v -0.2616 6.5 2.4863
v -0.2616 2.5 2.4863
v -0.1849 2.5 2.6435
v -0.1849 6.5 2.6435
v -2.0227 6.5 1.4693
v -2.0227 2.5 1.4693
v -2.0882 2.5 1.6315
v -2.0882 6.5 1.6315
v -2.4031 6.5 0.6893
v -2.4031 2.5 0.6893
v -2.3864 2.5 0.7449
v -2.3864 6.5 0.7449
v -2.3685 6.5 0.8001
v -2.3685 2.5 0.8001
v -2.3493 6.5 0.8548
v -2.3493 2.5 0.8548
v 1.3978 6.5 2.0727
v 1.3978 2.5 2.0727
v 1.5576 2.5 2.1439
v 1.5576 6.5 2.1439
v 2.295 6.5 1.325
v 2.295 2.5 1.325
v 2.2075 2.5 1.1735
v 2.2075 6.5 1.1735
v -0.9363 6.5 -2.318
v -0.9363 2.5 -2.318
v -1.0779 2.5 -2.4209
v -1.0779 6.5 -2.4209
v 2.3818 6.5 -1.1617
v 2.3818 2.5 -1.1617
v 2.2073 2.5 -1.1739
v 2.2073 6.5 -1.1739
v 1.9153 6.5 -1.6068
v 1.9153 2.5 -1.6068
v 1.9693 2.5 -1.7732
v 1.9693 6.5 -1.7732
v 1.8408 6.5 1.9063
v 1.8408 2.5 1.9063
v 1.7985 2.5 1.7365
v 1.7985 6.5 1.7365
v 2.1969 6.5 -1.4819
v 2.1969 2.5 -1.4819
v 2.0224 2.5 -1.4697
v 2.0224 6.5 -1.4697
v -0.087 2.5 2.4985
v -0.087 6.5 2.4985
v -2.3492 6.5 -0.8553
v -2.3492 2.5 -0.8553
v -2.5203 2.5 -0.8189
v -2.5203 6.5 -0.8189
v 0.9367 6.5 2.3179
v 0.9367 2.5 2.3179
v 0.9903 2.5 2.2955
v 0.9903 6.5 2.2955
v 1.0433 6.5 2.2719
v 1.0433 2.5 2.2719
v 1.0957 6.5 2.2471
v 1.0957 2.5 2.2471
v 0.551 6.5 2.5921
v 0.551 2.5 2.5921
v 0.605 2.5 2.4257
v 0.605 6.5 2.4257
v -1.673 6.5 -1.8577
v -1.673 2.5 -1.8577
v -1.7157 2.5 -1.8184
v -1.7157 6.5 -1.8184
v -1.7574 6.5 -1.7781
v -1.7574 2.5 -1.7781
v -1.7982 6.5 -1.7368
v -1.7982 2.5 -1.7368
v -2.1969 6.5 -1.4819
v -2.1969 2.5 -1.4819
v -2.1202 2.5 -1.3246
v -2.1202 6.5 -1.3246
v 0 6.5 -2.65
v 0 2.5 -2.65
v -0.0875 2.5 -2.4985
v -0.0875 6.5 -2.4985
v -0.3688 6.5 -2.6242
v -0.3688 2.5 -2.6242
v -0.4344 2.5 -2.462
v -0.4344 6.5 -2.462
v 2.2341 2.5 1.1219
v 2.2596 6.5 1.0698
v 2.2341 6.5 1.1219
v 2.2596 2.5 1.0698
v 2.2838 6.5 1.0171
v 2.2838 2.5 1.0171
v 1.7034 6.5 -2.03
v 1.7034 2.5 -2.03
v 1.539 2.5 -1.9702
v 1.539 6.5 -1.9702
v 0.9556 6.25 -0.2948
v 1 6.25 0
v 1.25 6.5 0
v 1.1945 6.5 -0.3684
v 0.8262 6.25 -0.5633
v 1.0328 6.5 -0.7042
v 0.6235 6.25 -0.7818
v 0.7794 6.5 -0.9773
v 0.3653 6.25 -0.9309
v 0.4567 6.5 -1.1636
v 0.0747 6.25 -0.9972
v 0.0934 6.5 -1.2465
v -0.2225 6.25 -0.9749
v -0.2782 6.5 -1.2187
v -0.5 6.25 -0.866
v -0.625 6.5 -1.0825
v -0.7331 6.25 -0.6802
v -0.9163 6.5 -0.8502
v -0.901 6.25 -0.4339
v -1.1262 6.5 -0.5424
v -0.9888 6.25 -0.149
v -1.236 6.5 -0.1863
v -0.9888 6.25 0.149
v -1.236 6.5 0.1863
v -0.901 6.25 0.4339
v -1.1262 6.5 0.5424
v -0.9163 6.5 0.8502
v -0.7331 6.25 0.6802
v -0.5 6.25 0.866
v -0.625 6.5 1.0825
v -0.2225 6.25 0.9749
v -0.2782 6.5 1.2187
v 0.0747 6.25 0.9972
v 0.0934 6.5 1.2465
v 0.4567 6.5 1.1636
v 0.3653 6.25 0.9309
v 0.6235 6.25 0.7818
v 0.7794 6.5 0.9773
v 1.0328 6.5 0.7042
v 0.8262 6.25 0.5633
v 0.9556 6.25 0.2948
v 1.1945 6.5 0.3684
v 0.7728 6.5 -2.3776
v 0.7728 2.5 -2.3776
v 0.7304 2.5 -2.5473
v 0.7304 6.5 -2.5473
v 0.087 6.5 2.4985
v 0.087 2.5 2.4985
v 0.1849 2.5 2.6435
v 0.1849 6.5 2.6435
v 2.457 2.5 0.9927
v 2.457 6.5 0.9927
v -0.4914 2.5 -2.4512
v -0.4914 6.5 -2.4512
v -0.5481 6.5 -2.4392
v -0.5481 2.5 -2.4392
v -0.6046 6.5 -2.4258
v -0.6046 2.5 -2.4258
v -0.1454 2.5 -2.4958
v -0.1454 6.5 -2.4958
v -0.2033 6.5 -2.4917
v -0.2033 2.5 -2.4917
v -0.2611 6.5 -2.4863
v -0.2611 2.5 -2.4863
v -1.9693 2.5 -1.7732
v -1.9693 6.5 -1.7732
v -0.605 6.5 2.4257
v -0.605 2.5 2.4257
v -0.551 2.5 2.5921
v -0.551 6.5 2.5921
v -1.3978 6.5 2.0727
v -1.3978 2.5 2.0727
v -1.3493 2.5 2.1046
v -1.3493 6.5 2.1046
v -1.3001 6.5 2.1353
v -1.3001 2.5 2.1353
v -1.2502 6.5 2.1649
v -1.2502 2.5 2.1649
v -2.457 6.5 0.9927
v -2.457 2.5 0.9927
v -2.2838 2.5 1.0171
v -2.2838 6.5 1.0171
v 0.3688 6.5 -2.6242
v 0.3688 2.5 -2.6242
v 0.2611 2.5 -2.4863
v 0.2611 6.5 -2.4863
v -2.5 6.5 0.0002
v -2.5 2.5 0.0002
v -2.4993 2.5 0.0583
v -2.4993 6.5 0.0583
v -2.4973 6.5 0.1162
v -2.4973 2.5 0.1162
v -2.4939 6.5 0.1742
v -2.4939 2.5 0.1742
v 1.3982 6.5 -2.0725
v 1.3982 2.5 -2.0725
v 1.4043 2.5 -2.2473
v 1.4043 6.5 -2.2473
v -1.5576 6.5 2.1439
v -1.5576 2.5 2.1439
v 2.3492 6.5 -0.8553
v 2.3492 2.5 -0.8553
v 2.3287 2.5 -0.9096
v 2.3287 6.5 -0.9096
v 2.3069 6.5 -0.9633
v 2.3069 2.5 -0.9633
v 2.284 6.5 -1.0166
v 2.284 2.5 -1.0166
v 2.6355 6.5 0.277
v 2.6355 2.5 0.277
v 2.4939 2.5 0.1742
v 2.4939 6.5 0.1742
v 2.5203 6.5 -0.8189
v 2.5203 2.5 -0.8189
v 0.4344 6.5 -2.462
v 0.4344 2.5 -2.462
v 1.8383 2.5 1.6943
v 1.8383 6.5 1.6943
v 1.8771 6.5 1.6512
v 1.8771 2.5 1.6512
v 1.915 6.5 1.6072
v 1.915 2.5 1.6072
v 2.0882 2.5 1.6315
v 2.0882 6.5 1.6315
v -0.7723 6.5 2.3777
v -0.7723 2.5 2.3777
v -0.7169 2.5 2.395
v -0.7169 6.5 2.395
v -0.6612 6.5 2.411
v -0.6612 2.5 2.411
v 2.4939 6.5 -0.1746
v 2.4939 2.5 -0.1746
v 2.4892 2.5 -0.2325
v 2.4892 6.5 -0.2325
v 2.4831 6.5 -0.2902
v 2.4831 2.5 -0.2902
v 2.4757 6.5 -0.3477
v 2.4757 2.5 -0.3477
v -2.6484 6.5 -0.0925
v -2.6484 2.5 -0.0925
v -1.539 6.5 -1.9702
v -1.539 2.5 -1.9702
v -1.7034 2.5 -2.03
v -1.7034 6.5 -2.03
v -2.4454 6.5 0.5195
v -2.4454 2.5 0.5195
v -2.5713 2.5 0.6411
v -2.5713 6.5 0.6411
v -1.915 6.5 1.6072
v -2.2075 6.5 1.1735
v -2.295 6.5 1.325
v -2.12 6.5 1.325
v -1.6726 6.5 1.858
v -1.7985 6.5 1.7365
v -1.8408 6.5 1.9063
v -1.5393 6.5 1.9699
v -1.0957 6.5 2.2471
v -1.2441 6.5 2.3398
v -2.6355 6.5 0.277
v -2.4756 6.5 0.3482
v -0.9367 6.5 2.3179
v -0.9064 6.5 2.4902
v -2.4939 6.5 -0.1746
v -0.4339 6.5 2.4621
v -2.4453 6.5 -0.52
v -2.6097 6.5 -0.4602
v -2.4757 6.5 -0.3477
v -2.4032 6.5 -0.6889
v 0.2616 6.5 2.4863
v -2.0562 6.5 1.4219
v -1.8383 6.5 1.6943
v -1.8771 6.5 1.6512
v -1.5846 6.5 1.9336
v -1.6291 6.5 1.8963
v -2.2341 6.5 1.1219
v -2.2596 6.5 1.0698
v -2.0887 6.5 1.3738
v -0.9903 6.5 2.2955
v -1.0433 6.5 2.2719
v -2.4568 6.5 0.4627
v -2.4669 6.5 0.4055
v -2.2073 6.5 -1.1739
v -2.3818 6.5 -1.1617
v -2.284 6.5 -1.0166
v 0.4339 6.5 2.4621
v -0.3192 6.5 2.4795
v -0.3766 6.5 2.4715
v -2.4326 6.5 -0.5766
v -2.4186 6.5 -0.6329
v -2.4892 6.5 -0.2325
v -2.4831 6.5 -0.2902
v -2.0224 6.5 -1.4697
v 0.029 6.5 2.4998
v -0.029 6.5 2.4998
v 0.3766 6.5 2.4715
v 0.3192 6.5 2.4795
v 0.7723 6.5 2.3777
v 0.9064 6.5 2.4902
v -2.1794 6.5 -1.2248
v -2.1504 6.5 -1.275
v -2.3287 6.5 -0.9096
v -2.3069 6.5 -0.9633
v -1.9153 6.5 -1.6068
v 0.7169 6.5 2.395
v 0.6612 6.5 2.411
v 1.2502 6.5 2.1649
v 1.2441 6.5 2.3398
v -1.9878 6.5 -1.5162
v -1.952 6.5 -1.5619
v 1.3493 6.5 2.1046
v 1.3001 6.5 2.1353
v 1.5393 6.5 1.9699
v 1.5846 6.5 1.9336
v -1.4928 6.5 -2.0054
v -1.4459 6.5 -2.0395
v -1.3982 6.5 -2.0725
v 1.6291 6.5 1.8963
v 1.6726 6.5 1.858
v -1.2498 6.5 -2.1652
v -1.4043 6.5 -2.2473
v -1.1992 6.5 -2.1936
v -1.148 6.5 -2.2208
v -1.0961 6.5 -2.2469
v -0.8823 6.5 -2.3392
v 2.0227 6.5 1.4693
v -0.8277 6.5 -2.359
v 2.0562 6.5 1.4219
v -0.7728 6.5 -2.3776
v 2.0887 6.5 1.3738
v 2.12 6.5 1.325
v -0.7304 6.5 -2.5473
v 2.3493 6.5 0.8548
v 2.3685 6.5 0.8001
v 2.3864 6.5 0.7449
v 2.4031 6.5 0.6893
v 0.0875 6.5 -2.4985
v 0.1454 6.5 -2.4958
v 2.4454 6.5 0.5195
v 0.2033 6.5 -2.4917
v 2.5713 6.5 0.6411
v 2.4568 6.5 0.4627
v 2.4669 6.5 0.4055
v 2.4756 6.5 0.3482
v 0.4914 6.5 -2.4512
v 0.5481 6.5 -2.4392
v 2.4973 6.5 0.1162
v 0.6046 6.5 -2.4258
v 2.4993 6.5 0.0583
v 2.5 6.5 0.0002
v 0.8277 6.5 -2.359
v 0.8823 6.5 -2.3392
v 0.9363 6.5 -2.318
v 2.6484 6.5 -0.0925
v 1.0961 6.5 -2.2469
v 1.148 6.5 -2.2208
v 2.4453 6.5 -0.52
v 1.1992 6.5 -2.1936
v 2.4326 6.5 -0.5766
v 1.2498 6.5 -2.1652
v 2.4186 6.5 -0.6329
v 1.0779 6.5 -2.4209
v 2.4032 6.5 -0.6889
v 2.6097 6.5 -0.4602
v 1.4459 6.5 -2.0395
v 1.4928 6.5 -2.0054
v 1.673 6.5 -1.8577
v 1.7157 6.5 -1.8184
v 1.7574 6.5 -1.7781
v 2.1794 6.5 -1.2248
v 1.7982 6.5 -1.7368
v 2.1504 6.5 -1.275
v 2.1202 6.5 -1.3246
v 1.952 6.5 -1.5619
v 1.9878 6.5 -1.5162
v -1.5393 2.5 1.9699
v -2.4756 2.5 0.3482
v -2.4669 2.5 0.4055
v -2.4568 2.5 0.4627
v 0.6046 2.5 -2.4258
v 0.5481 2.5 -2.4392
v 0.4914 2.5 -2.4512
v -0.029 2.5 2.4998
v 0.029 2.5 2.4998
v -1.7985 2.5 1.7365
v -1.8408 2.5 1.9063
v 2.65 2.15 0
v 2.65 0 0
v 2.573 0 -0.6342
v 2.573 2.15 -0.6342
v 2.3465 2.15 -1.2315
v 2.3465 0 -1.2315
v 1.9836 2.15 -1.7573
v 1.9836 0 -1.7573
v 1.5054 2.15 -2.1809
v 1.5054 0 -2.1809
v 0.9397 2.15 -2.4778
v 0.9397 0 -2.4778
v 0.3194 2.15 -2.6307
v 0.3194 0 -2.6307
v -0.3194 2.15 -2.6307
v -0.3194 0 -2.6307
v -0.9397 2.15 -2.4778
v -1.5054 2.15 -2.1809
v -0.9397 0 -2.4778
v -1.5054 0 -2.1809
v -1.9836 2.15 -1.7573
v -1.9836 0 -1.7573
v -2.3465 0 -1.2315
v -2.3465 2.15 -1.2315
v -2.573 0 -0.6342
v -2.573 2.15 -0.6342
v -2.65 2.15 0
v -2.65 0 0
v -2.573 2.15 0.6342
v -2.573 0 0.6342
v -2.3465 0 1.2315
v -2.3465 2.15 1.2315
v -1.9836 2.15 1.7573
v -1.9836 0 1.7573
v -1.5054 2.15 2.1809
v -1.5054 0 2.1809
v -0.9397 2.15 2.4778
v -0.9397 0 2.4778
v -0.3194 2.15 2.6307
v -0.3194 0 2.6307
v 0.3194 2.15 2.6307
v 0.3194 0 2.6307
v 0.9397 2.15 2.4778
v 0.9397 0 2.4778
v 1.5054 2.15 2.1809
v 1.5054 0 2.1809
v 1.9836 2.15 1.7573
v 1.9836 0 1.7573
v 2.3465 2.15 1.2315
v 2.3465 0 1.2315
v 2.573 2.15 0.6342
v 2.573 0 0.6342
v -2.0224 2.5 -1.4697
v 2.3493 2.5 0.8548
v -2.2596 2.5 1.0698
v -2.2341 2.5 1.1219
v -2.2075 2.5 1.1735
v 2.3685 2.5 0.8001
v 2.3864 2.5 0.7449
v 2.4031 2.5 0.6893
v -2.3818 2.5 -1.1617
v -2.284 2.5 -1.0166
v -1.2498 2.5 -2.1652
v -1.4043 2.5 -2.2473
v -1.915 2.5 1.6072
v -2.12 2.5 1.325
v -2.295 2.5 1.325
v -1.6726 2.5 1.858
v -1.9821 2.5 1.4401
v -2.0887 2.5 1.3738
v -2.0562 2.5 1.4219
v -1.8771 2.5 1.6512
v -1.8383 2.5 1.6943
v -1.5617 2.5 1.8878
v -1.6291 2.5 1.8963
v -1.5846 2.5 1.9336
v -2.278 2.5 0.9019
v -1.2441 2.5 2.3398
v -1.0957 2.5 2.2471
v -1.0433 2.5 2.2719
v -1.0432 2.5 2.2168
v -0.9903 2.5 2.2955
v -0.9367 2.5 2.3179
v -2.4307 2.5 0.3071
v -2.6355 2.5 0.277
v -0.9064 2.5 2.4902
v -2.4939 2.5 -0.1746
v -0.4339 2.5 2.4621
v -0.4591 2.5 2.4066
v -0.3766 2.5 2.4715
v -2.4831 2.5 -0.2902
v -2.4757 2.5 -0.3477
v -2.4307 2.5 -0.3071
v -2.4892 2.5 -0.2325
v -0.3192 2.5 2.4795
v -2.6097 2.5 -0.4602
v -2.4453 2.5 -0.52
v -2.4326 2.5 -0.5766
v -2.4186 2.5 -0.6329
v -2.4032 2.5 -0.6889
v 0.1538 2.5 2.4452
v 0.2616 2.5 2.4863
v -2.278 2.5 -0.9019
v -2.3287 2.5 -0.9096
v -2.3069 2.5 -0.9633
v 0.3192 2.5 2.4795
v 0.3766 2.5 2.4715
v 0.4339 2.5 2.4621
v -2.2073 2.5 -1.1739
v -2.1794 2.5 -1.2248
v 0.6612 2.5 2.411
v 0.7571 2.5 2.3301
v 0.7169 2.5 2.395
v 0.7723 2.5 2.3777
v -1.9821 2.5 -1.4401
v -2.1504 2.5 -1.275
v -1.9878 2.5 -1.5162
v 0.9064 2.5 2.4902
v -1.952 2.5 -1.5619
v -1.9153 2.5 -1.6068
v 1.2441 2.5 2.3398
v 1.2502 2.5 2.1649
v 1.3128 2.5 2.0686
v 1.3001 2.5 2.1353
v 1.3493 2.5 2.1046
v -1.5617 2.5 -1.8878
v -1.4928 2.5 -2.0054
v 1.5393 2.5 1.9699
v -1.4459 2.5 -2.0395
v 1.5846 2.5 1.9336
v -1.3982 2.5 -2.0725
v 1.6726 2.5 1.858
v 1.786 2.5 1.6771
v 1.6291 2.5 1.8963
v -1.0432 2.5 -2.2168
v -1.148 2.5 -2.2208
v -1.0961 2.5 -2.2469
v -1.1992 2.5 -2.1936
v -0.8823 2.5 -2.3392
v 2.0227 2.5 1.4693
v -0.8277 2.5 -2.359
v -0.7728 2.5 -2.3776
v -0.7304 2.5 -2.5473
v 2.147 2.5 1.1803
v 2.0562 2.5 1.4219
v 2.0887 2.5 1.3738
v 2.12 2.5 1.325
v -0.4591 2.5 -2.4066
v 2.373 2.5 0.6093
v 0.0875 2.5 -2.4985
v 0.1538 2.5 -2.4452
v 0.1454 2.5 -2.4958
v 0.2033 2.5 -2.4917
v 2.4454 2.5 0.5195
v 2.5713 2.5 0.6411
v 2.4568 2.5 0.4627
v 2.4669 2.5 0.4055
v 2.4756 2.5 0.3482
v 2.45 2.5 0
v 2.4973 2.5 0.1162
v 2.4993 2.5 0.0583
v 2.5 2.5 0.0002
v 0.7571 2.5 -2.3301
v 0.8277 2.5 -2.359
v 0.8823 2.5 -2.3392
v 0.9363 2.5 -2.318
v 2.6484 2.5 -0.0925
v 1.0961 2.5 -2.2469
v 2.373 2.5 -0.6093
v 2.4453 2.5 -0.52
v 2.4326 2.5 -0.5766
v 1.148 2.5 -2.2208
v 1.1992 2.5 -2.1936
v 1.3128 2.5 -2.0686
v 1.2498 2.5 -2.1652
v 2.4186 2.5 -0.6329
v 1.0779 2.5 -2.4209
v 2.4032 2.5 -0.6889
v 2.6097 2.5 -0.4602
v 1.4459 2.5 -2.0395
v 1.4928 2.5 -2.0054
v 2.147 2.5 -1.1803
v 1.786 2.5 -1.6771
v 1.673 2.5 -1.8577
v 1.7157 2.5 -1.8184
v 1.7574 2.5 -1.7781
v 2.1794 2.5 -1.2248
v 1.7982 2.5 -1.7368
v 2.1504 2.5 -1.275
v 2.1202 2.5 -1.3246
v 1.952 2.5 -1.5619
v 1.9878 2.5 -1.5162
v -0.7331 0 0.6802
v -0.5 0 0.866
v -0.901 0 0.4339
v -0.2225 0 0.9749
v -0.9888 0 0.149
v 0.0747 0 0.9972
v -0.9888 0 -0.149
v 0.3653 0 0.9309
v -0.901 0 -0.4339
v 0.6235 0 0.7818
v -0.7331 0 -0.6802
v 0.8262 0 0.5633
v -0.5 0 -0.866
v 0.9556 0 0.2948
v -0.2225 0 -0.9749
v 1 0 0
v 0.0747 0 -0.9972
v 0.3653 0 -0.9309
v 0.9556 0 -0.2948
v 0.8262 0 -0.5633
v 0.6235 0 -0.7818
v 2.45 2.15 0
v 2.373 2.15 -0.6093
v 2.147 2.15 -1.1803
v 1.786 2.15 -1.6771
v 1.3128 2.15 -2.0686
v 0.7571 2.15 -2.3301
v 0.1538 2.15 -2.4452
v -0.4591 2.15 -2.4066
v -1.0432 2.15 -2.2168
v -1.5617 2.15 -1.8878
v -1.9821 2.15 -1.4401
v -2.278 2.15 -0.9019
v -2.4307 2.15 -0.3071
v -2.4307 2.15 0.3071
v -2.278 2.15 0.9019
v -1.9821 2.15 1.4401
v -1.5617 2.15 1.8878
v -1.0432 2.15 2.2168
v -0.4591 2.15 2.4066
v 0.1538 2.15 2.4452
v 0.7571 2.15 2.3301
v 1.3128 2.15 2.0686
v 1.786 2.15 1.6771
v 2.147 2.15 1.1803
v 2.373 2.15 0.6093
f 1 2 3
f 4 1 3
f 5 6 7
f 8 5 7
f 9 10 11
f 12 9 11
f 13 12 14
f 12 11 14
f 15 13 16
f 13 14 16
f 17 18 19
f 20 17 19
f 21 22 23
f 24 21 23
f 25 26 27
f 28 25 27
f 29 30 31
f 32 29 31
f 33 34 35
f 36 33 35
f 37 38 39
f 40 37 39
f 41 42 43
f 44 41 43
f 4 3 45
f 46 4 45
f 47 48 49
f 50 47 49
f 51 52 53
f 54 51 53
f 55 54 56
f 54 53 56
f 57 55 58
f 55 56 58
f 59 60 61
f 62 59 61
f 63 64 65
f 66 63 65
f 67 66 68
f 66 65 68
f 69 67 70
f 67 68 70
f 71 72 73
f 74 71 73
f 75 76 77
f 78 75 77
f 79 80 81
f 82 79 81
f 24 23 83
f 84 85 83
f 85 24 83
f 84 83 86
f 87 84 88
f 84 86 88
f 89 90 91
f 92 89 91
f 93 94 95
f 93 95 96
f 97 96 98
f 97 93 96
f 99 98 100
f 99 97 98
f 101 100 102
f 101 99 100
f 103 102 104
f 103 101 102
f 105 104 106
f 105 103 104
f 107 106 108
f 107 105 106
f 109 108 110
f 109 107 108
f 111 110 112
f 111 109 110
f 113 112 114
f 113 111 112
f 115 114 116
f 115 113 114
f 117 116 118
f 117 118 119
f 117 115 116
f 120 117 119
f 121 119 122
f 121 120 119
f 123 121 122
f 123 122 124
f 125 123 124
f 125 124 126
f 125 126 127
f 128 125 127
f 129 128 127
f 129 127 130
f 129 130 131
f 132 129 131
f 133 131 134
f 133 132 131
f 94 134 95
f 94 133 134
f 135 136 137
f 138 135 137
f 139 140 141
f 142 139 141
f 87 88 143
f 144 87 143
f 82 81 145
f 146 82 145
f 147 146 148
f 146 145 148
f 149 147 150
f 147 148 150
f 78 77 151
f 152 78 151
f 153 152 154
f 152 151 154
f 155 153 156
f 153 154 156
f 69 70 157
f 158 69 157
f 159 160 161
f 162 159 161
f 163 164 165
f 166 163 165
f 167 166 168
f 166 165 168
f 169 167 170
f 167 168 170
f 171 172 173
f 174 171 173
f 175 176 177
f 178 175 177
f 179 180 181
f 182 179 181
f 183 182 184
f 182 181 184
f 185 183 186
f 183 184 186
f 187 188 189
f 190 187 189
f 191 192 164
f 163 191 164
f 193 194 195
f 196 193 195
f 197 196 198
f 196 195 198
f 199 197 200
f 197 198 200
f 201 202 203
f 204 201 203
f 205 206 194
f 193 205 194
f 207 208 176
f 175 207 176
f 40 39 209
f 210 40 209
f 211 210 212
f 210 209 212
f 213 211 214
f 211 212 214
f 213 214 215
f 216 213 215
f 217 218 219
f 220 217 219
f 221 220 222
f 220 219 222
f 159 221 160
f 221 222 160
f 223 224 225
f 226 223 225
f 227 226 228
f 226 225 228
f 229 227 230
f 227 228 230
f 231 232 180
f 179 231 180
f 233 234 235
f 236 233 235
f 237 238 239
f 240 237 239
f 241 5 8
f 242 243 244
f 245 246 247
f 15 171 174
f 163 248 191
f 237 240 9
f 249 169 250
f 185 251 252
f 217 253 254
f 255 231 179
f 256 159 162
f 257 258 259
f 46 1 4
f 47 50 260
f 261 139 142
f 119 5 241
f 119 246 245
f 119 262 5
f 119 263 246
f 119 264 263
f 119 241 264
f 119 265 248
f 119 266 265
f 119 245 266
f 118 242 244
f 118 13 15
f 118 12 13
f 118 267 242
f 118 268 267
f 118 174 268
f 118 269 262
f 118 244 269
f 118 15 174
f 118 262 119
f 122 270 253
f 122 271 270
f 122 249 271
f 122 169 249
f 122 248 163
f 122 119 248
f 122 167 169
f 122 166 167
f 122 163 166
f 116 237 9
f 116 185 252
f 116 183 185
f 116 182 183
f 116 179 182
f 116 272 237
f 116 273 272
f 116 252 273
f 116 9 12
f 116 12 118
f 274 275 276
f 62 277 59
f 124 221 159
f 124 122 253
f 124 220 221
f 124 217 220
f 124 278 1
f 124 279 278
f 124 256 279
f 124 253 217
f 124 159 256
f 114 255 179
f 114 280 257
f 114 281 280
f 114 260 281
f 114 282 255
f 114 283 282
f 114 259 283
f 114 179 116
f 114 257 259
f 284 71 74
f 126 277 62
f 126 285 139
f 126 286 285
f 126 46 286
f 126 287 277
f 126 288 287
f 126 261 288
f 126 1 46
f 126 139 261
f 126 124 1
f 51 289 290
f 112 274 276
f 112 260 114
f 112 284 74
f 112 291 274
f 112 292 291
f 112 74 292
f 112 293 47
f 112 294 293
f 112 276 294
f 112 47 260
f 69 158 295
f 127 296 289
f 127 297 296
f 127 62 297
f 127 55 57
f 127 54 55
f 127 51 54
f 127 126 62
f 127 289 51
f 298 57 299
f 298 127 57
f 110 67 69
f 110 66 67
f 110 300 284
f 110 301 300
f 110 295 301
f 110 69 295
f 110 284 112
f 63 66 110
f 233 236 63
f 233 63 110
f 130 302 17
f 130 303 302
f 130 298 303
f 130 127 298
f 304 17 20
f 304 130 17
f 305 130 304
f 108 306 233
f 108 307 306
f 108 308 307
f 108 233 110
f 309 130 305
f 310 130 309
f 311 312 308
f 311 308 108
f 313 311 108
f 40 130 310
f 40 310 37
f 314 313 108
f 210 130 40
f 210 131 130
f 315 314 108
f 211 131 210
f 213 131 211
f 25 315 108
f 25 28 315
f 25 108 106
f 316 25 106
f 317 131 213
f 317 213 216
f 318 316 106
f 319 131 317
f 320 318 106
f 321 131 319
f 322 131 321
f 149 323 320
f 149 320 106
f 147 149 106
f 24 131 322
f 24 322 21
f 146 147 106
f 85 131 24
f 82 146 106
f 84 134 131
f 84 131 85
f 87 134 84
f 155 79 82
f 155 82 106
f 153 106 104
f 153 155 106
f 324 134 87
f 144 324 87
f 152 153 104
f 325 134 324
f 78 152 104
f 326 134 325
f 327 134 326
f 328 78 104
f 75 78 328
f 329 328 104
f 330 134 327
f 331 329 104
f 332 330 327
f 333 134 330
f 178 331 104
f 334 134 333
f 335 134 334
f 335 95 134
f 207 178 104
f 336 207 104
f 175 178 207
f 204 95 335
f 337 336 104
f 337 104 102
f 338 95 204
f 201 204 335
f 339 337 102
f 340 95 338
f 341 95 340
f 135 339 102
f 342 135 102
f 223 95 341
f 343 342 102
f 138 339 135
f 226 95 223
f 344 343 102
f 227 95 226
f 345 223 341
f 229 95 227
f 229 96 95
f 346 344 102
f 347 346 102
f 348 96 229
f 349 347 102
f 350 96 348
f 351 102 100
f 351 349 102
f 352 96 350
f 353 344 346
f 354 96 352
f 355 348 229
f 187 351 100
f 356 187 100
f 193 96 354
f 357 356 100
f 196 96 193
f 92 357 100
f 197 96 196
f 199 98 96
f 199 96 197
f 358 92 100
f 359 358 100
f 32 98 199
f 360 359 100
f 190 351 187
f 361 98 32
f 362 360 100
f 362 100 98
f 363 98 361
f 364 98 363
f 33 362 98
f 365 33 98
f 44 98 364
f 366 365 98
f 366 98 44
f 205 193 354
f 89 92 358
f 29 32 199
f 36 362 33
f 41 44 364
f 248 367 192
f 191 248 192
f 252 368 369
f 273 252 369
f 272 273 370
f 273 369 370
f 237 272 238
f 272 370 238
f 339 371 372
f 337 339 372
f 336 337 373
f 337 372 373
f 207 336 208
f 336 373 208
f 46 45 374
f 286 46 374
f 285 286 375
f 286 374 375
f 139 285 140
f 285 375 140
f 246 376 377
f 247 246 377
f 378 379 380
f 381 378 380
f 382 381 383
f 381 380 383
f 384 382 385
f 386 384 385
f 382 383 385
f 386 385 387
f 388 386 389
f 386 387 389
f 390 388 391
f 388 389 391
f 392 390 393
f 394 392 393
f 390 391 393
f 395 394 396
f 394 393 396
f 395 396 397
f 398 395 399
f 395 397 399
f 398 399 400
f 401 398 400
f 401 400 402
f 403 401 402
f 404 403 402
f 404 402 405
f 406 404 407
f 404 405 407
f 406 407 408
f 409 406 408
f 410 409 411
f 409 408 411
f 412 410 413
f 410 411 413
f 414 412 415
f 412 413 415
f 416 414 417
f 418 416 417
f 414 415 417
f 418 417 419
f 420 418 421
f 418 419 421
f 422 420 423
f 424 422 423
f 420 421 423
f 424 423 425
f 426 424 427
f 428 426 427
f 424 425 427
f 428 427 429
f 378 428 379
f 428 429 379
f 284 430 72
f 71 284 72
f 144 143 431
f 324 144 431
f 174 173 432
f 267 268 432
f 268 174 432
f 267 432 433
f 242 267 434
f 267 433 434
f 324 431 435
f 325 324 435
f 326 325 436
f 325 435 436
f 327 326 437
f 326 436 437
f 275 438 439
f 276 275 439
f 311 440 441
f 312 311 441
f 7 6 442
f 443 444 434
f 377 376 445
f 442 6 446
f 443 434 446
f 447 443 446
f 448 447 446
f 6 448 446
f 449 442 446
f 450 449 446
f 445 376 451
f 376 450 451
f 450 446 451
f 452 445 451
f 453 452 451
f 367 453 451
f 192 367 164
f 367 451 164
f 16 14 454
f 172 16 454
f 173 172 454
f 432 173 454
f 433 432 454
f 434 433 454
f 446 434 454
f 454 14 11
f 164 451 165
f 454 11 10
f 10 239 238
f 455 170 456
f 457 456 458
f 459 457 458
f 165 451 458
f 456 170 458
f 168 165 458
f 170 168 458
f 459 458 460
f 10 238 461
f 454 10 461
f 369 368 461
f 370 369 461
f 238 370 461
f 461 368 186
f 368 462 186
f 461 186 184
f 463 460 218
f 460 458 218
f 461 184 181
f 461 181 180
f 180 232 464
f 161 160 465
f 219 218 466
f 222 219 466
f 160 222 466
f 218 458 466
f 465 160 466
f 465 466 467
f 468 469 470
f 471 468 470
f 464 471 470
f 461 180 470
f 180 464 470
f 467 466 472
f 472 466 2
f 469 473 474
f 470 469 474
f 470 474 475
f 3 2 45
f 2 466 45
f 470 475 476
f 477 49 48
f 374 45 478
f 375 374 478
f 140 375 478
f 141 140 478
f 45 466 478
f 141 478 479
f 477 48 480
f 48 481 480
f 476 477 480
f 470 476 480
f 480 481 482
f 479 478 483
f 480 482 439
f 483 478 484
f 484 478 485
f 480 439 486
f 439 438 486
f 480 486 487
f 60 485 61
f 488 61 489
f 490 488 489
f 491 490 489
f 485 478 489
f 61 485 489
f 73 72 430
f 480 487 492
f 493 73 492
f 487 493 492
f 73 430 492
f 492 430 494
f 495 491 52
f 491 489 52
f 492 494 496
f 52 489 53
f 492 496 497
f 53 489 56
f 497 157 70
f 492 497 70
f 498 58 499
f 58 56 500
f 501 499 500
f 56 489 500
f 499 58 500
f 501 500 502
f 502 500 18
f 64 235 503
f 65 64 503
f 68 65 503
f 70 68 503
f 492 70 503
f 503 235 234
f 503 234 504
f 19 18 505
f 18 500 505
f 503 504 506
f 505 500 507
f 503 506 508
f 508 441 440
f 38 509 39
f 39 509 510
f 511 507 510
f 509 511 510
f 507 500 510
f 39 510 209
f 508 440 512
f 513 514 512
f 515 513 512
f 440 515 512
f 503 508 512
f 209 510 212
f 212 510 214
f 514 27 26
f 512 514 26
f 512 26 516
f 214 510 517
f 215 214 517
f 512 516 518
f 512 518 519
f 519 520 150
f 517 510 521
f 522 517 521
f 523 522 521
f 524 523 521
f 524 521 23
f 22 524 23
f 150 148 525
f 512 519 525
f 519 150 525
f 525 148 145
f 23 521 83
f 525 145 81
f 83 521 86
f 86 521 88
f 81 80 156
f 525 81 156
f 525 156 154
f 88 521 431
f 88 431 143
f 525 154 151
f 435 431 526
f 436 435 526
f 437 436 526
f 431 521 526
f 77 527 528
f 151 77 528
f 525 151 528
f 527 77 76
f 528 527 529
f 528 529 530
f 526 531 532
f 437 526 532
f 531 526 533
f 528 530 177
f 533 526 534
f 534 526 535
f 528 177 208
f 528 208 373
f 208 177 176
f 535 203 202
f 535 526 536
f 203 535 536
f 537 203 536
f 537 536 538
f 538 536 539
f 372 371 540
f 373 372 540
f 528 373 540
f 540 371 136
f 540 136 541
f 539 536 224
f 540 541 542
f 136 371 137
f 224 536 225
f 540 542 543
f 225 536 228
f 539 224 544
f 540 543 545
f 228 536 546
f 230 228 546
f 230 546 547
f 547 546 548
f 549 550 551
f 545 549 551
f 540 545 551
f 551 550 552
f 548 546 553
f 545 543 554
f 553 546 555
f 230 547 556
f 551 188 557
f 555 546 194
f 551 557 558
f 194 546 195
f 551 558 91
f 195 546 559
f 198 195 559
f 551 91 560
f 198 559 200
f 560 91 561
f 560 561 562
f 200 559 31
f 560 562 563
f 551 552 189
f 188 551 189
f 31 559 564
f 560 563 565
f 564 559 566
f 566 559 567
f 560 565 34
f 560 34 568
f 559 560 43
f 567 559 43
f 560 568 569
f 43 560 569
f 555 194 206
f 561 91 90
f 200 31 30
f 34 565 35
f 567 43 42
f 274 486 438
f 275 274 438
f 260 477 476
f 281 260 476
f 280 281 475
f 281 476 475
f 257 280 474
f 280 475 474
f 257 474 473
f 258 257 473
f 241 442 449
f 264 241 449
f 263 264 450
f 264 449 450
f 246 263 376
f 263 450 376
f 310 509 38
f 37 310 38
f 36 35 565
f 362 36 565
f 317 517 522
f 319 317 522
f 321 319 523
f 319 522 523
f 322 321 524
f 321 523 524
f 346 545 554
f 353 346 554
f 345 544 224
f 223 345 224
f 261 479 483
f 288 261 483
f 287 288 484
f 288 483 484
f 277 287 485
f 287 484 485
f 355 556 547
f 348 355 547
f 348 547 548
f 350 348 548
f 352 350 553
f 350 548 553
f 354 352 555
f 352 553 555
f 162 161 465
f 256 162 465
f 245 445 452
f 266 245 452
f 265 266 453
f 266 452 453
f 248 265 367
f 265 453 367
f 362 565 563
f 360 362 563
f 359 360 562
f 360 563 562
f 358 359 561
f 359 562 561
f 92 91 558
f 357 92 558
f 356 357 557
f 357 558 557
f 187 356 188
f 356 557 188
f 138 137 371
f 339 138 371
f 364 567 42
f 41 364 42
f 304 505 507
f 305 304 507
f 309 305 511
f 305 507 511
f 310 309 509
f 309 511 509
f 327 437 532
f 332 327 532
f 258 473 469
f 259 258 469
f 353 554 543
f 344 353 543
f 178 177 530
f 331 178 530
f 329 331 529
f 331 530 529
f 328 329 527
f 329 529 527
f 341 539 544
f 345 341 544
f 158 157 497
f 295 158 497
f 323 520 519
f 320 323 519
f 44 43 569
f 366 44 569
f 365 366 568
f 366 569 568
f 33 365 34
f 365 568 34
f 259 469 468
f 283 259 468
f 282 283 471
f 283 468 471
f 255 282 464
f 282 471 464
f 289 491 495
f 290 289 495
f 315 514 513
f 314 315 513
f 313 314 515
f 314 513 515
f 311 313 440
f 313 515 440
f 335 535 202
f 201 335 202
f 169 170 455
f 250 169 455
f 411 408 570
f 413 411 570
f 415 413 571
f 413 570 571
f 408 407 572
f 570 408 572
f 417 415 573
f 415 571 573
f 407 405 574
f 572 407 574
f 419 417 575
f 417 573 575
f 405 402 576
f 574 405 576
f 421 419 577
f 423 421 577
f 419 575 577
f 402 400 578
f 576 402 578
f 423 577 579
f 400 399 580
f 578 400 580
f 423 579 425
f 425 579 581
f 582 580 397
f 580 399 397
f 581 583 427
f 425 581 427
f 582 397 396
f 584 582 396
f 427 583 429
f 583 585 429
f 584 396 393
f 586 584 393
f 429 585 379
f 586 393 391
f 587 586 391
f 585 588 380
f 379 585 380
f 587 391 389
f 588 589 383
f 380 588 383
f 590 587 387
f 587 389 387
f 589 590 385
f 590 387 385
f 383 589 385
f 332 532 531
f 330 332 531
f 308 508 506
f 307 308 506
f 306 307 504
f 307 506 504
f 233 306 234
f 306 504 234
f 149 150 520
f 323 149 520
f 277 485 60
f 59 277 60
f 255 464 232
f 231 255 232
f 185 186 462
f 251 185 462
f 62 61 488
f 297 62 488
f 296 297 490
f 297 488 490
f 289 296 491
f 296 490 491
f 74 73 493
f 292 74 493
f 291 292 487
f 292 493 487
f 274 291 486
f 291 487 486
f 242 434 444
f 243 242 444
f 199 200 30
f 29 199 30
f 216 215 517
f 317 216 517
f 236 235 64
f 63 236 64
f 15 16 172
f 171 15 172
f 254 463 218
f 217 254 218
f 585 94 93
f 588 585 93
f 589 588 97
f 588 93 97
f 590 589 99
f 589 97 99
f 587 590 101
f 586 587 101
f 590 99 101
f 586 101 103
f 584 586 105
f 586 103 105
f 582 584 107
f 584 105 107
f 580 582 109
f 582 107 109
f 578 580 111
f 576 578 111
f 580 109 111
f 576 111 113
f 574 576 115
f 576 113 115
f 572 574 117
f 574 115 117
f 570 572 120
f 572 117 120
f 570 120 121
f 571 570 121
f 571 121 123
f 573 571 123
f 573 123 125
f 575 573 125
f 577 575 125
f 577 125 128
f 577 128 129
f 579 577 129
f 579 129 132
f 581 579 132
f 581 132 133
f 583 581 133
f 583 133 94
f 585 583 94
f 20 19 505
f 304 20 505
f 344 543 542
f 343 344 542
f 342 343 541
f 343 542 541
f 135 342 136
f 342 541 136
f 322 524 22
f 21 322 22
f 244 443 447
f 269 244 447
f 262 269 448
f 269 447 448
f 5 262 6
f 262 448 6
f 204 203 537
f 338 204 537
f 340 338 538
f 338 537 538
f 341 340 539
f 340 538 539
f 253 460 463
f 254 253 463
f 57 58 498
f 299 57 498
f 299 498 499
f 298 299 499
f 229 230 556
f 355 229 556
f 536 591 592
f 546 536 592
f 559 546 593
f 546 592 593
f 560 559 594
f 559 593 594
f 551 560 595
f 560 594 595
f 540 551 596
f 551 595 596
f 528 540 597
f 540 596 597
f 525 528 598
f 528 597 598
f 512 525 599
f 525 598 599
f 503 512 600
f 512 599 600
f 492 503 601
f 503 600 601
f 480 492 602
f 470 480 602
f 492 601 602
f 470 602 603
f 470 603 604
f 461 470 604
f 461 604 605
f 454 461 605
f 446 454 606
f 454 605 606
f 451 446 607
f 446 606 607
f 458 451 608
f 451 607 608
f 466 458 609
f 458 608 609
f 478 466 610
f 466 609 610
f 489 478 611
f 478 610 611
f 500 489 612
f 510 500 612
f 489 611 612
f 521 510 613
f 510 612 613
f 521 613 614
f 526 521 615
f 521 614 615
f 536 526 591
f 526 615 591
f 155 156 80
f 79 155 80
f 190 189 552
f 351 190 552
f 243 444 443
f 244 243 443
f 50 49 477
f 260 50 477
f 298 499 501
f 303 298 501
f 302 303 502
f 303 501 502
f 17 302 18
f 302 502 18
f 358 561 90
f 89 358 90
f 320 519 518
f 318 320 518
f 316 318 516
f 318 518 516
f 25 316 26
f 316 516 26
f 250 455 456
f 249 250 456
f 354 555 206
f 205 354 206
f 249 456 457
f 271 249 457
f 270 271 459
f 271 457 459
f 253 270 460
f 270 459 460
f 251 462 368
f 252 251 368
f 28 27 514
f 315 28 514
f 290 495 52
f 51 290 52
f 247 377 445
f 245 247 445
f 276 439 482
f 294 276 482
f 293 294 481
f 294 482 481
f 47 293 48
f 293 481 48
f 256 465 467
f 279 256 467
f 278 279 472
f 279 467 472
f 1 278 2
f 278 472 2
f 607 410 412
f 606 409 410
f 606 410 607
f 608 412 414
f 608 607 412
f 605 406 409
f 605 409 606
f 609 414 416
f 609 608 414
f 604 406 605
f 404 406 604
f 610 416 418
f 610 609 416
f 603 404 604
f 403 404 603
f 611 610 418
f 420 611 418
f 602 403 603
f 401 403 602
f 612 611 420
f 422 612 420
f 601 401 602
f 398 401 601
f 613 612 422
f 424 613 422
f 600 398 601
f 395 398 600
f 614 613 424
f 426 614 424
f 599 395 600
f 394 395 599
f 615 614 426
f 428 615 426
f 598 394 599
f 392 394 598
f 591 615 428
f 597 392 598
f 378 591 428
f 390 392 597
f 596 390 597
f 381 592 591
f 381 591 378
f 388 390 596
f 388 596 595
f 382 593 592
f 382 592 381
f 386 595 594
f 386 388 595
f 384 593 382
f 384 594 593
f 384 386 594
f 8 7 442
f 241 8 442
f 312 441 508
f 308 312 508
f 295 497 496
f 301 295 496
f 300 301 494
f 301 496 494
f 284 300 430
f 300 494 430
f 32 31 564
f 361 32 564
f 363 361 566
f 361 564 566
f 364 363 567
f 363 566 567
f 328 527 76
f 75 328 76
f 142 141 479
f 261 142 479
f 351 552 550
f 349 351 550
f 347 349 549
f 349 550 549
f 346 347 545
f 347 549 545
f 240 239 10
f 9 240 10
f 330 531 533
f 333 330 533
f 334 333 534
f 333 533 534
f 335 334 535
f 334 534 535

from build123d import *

# Parameters (mm, degrees)
SCHIZZO1_R                   = 2.65
ESTRUSIONE_ESTRUSIONE1_DEPTH = 2.15
SCHIZZO2_R                   = 2.55
ESTRUSIONE_ESTRUSIONE2_DEPTH = 0.35
ESTRUSIONE_ESTRUSIONE3_DEPTH = 4
SCHIZZO4_R                   = 2.5
ESTRUSIONE_ESTRUSIONE4_DEPTH = 4
RIPETIZIONECIRCOLARE1_COUNT  = 45
SCHIZZO5_R                   = 1
TAGLIO_ESTRUSIONE1_DEPTH     = 7.5
SMUSSO1_SIZE                 = 0.25
SCHIZZO6_R                   = 2.75
SCHIZZO6_R_2                 = 2.45
TAGLIO_ESTRUSIONE2_DEPTH     = 0.35


with BuildPart() as part:
    # Schizzo1 → Estrusione-Estrusione1 (new body)
    with BuildSketch(Plane(origin=(0, 0, 0), x_dir=(1, 0, 0), z_dir=(0, 1, 0))):
        Circle(SCHIZZO1_R)
    extrude(amount=ESTRUSIONE_ESTRUSIONE1_DEPTH)

    # Schizzo2 → Estrusione-Estrusione2 (add)
    with BuildSketch(Plane(origin=(0, 2.15, 0), x_dir=(1, 0, 0), z_dir=(0, 1, 0))):
        Circle(SCHIZZO2_R)
    extrude(amount=ESTRUSIONE_ESTRUSIONE2_DEPTH)

    # Schizzo3 → Estrusione-Estrusione3 (add)
    with BuildSketch(Plane(origin=(0, 2.5, 0), x_dir=(1, 0, 0), z_dir=(0, 1, 0))):
        with BuildLine():
            Line((0, 2.65), (-0.087486608, 2.49846875))
            ThreePointArc((-0.087486608, 2.49846875), (0, 2.5), (0.087486608, 2.49846875))
            Line((0.087486608, 2.49846875), (0, 2.65))
        make_face()
    estrusione_estrusione3 = extrude(amount=ESTRUSIONE_ESTRUSIONE3_DEPTH)

    # Schizzo4 → Estrusione-Estrusione4 (add)
    with BuildSketch(Plane(origin=(0, 2.5, 0), x_dir=(1, 0, 0), z_dir=(0, 1, 0))):
        Circle(SCHIZZO4_R)
    extrude(amount=ESTRUSIONE_ESTRUSIONE4_DEPTH)

    # RipetizioneCircolare1: Estrusione-Estrusione3 ×45 about axis
    ripetizionecircolare1_axis = Axis((0, 0, 0), (0, 1, 0))
    for i in range(1, RIPETIZIONECIRCOLARE1_COUNT):
        add(estrusione_estrusione3.rotate(ripetizionecircolare1_axis, i * 360 / RIPETIZIONECIRCOLARE1_COUNT))

    # Schizzo5 → Taglio-Estrusione1 (cut, through all)
    with BuildSketch(Plane(origin=(0, 6.5, 0), x_dir=(1, 0, 0), z_dir=(0, 1, 0))):
        Circle(SCHIZZO5_R)
    extrude(amount=-TAGLIO_ESTRUSIONE1_DEPTH, mode=Mode.SUBTRACT)

    # Smusso1
    smusso1_edges = [part.edges().sort_by_distance(p)[0] for p in [
        (-1, 6.5, 0),
    ]]
    chamfer(smusso1_edges, length=SMUSSO1_SIZE)

    # Schizzo6 → Taglio-Estrusione2 (cut)
    with BuildSketch(Plane(origin=(0, 2.15, 0), x_dir=(1, 0, 0), z_dir=(0, 1, 0))):
        Circle(SCHIZZO6_R)
        Circle(SCHIZZO6_R_2, mode=Mode.SUBTRACT)
    extrude(amount=TAGLIO_ESTRUSIONE2_DEPTH, mode=Mode.SUBTRACT)


solid = part.part
